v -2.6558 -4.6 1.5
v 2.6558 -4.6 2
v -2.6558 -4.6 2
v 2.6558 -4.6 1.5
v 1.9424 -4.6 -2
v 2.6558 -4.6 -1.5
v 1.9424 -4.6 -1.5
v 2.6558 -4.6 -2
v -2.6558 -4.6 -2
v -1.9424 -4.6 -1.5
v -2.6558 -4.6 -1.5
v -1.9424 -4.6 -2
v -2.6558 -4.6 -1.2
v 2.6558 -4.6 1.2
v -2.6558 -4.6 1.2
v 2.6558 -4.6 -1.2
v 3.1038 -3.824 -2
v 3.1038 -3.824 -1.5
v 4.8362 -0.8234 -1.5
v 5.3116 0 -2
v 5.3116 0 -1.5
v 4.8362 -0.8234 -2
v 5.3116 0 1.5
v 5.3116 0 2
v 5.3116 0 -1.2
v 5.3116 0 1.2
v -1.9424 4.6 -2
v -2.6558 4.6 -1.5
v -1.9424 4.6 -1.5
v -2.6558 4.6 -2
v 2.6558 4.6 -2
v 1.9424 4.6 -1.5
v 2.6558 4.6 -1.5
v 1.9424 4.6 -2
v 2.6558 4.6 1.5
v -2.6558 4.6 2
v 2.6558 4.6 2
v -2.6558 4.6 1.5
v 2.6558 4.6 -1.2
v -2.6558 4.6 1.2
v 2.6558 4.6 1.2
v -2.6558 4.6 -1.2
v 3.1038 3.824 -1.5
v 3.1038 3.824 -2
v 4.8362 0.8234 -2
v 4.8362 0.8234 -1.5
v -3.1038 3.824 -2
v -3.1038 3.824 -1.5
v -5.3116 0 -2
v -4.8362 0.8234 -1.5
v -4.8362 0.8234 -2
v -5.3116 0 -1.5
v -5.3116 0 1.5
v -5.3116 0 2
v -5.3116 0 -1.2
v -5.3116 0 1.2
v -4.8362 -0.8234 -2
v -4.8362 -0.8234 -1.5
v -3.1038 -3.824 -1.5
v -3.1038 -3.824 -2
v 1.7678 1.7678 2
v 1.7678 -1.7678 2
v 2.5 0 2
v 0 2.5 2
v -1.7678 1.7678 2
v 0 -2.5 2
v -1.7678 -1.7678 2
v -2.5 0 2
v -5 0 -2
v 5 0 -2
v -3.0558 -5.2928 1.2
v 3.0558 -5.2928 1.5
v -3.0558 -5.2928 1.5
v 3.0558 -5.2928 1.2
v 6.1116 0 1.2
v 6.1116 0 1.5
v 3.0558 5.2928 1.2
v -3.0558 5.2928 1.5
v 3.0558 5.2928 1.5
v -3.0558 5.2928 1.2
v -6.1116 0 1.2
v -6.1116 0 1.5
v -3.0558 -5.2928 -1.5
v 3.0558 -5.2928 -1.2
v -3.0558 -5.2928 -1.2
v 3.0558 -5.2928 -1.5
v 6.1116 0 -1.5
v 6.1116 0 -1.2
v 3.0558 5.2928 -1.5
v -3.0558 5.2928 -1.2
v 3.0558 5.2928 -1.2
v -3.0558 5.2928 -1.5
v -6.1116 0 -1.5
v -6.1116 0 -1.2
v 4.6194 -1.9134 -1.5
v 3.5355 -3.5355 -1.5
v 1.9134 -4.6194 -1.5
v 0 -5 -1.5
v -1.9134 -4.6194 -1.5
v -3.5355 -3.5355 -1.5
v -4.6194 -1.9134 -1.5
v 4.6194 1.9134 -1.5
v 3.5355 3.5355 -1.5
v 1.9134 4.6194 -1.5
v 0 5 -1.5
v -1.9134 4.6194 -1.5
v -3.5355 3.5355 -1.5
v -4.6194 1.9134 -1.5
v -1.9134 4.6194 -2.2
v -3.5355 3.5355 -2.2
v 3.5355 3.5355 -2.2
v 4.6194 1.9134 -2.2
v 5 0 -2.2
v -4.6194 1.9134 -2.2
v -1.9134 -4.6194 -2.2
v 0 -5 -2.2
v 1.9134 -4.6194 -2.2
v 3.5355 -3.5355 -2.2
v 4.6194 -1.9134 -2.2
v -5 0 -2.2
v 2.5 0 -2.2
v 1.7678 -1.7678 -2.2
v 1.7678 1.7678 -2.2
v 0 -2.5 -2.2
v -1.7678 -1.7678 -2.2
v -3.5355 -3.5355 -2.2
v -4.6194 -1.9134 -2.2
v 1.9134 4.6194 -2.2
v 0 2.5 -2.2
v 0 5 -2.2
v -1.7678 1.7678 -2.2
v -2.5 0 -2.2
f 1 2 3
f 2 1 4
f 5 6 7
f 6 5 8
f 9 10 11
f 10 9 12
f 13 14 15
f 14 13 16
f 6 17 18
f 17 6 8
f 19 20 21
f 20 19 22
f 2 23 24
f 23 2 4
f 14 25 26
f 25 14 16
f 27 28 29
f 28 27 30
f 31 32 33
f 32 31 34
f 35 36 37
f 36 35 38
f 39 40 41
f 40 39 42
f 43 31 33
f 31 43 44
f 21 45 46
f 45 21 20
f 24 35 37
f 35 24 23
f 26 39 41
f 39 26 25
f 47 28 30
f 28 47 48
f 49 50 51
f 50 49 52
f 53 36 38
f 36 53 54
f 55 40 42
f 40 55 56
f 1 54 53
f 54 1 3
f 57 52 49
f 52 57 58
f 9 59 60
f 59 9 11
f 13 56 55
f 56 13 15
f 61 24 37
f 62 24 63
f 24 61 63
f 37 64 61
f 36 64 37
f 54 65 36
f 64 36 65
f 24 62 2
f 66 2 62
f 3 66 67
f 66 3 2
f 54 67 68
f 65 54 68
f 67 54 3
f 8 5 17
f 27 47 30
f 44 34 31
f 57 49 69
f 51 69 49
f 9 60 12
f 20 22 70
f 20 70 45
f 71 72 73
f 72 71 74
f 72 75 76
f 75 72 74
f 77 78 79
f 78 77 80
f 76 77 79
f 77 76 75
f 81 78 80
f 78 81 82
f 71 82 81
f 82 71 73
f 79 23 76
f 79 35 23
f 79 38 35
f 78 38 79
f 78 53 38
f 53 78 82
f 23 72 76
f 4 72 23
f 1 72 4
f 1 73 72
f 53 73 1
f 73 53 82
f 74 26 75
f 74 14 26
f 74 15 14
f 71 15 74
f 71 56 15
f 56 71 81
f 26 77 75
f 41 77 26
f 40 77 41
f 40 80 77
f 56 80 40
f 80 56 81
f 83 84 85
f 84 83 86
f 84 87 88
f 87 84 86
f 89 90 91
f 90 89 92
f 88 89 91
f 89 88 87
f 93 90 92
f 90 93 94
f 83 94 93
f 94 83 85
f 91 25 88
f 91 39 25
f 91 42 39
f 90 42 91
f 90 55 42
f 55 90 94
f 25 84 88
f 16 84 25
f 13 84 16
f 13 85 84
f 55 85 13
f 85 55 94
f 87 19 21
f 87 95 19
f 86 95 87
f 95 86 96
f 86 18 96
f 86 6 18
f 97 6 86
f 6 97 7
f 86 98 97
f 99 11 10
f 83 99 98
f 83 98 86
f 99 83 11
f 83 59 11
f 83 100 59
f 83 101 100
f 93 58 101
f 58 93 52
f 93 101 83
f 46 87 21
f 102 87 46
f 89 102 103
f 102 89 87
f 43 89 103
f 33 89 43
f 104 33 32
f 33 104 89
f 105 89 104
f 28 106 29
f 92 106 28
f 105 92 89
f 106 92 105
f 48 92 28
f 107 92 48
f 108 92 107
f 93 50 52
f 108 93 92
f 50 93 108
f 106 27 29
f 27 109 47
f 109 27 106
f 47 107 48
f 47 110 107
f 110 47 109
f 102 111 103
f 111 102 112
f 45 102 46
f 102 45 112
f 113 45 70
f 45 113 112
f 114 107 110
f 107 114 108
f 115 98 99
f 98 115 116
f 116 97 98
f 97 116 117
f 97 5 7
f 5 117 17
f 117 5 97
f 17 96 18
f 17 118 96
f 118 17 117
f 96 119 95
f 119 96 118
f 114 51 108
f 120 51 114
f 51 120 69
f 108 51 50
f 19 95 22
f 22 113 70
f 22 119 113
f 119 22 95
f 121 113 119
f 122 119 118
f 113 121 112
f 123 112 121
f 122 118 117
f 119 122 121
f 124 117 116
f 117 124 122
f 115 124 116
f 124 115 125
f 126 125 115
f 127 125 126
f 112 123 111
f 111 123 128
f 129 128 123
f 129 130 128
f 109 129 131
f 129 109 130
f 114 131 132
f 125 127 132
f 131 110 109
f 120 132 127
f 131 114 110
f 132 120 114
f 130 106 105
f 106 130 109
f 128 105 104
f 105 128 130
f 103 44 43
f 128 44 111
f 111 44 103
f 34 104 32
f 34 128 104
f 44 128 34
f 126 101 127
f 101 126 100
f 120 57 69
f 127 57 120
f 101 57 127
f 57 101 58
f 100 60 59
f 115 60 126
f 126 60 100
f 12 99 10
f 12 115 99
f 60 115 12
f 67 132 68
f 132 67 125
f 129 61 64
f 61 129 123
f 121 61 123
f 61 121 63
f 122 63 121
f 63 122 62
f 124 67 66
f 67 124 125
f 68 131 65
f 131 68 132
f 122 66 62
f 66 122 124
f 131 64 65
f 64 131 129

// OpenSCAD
// Parameters
thread_nominal_diameter = 5; //[2.5:10:0.1]
across_flats = 9.2; //[4.6:18.4:0.1]
thickness = 4; //[2:8:0.1]
bore_type = 0; //[0:1:1]
thread_pitch = 0.8; //[0.4:1.6:0.05]
clearance_diameter_if_unthreaded = 5.5; //[4.5:7:0.1]
chamfer_size = 0.3; //[0.1:1:0.05]
overlap = 0.8; //[0.5:2:0.1]
washer_outer_diameter = 10; //[6:20:0.1]
washer_thickness = 1; //[0.5:3:0.1]

// Derived
hex_r = across_flats/(2*cos(30));
bore_r = ((1-bore_type)*thread_nominal_diameter + bore_type*clearance_diameter_if_unthreaded)/2;

// Nut and Washer - complete geometry (single connected solid)
module nut_and_washer() {
  color("DimGray")
  difference() {
    // UNION of all solids to guarantee connectivity (with intentional overlap)
    union() {
      // Hex Nut Body
      cylinder(r=hex_r, h=thickness, center=true, $fn=6);

      // Top thin plate/sheet (attached with overlap into nut body)
      // Plate thickness uses chamfer_size; overlaps into nut by `overlap`
      translate([0, 0, thickness/2 + chamfer_size/2 - overlap])
        cylinder(r=hex_r + overlap, h=chamfer_size, center=true, $fn=6);

      // Bottom thin plate/sheet (attached with overlap into nut body)
      translate([0, 0, -thickness/2 - chamfer_size/2 + overlap])
        cylinder(r=hex_r + overlap, h=chamfer_size, center=true, $fn=6);

      // Washer (attached to bottom plate/nut with overlap)
      // Top of washer intersects bottom plate by `overlap`
      translate([0, 0, -thickness/2 - washer_thickness/2 + overlap])
        cylinder(r=washer_outer_diameter/2, h=washer_thickness, center=true);
    }

    // Central Bore (cuts through everything: nut + plates + washer)
    cylinder(r=bore_r, h=thickness + 2*chamfer_size + washer_thickness + 4*overlap, center=true);

    // Washer bore (redundant but harmless; kept explicit)
    translate([0, 0, -thickness/2 - washer_thickness/2 + overlap])
      cylinder(r=bore_r, h=washer_thickness + 2*overlap, center=true);
  }
}

// Assembly
module assembly() {
  nut_and_washer();
}

assembly();
